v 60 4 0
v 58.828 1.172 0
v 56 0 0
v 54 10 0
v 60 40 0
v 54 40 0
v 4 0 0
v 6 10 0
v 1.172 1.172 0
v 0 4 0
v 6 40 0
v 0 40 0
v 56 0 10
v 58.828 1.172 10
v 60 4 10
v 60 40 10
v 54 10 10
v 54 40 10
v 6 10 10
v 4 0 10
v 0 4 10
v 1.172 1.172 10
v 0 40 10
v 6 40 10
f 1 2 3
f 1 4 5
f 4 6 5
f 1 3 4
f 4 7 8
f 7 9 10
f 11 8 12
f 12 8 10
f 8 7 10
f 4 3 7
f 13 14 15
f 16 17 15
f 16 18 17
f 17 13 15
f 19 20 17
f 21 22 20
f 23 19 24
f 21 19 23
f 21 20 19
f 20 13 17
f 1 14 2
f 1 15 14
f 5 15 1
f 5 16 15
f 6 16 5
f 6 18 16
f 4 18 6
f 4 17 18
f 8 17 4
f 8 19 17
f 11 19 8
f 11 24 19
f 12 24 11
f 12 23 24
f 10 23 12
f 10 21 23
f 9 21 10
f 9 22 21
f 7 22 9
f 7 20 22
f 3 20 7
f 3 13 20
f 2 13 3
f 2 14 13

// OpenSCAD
$fn = 32;

// ----------------------------------------------------------------------
// Heat sink frame: 60 x 40 mm frame, 6 mm walls
// ----------------------------------------------------------------------

// --- parameters (mm) ---
profile_height = 10;      // extrusion height
profile_points = 12;      // points of the closed outline

profile = [[0, 4], [1.172, 1.172], [4, 0], [56, 0], [58.828, 1.172], [60, 4], [60, 40], [54, 40], [54, 10], [6, 10], [6, 40], [0, 40]];  // single closed polygon, 12 points, counter clockwise

// --- the one profile operation ---
linear_extrude(height = profile_height) polygon(points = profile);
